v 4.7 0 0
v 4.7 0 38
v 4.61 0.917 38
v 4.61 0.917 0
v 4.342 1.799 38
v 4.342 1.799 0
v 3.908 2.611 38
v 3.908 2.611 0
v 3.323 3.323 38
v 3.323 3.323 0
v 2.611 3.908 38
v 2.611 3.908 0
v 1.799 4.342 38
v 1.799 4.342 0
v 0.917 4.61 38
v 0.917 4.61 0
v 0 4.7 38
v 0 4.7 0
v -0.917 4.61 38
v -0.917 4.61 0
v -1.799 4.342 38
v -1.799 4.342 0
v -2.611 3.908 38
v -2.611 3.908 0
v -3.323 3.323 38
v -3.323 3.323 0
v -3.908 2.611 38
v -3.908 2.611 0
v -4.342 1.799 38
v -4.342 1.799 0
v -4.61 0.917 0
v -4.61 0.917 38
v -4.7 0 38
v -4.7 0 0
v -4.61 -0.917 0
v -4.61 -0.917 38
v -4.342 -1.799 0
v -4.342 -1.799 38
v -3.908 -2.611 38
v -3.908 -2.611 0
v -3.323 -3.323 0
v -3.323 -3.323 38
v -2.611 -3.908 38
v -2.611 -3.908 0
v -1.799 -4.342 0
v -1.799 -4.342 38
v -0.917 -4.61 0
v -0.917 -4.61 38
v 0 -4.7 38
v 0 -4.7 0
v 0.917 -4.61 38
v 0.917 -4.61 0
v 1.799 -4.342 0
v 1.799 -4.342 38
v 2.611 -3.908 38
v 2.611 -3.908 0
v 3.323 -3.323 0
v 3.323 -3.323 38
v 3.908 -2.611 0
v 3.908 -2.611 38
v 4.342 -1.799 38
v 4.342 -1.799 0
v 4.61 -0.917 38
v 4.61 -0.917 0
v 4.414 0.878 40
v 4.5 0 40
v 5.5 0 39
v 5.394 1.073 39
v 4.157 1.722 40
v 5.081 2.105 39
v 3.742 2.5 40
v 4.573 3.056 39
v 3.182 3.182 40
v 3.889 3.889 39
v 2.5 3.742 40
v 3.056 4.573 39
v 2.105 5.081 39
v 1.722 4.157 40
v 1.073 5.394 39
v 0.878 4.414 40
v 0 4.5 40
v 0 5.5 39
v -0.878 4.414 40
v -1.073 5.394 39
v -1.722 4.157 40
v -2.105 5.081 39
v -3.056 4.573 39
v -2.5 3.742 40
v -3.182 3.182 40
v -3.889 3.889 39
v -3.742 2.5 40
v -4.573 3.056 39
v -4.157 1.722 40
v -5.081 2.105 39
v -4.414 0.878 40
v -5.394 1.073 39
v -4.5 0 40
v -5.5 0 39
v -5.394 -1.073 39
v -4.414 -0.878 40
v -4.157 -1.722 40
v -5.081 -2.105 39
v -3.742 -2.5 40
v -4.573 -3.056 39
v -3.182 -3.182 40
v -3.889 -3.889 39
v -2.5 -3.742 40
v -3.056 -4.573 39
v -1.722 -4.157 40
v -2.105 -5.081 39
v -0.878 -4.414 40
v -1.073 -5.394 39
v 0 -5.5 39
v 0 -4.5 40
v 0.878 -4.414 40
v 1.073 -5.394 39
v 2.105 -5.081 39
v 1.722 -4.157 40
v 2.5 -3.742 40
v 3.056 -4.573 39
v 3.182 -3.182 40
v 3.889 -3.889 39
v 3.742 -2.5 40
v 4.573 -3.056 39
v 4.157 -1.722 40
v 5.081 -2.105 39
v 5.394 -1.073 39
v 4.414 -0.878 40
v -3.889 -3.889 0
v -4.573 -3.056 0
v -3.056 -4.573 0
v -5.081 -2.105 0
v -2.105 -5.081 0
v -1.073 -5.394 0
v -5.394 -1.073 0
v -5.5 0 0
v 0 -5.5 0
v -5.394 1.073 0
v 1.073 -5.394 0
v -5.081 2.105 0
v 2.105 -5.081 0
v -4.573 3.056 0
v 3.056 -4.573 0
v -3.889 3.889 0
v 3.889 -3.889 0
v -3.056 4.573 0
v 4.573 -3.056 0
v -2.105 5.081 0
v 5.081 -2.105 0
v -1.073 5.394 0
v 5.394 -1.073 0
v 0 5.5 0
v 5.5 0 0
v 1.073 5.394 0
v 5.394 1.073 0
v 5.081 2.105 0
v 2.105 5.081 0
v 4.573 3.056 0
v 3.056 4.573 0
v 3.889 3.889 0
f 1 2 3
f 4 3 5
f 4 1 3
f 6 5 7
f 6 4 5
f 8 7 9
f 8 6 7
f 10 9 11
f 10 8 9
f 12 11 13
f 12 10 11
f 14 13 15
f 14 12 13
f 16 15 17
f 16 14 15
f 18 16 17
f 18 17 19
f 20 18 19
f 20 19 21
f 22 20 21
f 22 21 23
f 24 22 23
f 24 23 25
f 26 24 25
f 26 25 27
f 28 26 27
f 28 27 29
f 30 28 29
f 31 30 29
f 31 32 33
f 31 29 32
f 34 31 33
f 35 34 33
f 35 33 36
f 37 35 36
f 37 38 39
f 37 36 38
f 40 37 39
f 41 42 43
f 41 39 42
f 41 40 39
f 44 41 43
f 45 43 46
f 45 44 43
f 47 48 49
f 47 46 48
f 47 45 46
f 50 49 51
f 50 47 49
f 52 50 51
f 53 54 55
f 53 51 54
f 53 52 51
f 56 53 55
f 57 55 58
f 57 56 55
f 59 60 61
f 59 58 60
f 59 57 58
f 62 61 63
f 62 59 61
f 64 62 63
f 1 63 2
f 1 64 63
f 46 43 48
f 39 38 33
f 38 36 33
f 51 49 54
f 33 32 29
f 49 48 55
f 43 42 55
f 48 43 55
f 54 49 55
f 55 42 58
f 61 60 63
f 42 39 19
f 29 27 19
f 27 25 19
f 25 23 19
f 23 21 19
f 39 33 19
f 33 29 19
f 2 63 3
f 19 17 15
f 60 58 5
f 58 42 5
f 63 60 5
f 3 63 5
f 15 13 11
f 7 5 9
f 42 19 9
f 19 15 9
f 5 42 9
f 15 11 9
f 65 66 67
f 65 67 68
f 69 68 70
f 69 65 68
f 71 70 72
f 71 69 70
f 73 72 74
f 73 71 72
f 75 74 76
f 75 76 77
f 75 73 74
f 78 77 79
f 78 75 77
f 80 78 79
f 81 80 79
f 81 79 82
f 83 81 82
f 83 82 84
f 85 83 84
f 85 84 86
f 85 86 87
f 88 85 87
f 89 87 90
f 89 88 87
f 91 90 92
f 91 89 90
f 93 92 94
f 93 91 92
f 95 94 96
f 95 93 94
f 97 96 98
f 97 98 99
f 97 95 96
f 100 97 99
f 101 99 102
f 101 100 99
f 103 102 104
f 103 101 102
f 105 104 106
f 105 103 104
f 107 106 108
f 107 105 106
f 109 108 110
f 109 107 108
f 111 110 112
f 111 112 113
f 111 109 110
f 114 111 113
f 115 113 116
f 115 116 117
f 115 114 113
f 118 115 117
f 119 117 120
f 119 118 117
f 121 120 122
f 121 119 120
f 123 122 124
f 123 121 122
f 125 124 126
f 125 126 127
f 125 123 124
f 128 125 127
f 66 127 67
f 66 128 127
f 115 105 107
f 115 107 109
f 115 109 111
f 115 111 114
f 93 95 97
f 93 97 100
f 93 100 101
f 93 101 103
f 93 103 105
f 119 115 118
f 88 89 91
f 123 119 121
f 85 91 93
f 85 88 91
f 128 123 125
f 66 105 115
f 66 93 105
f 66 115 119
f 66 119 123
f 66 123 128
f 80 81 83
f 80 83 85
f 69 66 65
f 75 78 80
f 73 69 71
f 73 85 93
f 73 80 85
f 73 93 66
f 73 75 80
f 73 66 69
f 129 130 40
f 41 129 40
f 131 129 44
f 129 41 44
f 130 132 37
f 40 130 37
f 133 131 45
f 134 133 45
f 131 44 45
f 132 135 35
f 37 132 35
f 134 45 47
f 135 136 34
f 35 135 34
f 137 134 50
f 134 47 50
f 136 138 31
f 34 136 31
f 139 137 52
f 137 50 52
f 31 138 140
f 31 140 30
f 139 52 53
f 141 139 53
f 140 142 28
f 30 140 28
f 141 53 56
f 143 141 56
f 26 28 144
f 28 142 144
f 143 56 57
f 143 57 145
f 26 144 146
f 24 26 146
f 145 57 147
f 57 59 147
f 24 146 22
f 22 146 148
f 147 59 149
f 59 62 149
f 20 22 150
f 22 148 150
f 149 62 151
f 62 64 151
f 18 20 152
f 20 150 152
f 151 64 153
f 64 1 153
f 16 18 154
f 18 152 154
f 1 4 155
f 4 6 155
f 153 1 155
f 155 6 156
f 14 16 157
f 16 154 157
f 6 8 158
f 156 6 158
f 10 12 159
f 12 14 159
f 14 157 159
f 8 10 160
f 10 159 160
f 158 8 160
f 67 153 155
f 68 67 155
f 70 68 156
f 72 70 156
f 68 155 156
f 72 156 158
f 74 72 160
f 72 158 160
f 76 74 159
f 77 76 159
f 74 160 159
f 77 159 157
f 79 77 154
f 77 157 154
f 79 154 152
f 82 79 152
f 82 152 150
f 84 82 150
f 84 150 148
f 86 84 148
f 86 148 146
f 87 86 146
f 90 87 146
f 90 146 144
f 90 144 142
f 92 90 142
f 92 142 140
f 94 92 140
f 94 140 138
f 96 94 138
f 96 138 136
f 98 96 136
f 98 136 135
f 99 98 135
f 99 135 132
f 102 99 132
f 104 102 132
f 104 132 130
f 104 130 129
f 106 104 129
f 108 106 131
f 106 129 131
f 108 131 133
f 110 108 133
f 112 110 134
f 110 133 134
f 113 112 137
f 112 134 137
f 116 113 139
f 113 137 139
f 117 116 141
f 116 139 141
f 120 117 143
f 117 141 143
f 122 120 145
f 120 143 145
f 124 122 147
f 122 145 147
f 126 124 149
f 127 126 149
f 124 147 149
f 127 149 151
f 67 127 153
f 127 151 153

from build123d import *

# Parameters (mm, degrees)
SKETCH1_R           = 5.5
SKETCH1_R_2         = 4.7
BOSS_EXTRUDE1_DEPTH = 40
SKETCH2_R           = 5.5
BOSS_EXTRUDE2_DEPTH = 2
CHAMFER1_SIZE       = 1


with BuildPart() as part:
    # Sketch1 → Boss-Extrude1 (new body)
    with BuildSketch(Plane.XY):
        Circle(SKETCH1_R)
        Circle(SKETCH1_R_2, mode=Mode.SUBTRACT)
    extrude(amount=BOSS_EXTRUDE1_DEPTH)

    # Sketch2 → Boss-Extrude2 (add)
    with BuildSketch(Plane.XY.offset(40)):
        Circle(SKETCH2_R)
    extrude(amount=-BOSS_EXTRUDE2_DEPTH)

    # Chamfer1
    chamfer1_edges = [part.edges().sort_by_distance(p)[0] for p in [
        (-5.5, 0, 40),
    ]]
    chamfer(chamfer1_edges, length=CHAMFER1_SIZE)


solid = part.part
